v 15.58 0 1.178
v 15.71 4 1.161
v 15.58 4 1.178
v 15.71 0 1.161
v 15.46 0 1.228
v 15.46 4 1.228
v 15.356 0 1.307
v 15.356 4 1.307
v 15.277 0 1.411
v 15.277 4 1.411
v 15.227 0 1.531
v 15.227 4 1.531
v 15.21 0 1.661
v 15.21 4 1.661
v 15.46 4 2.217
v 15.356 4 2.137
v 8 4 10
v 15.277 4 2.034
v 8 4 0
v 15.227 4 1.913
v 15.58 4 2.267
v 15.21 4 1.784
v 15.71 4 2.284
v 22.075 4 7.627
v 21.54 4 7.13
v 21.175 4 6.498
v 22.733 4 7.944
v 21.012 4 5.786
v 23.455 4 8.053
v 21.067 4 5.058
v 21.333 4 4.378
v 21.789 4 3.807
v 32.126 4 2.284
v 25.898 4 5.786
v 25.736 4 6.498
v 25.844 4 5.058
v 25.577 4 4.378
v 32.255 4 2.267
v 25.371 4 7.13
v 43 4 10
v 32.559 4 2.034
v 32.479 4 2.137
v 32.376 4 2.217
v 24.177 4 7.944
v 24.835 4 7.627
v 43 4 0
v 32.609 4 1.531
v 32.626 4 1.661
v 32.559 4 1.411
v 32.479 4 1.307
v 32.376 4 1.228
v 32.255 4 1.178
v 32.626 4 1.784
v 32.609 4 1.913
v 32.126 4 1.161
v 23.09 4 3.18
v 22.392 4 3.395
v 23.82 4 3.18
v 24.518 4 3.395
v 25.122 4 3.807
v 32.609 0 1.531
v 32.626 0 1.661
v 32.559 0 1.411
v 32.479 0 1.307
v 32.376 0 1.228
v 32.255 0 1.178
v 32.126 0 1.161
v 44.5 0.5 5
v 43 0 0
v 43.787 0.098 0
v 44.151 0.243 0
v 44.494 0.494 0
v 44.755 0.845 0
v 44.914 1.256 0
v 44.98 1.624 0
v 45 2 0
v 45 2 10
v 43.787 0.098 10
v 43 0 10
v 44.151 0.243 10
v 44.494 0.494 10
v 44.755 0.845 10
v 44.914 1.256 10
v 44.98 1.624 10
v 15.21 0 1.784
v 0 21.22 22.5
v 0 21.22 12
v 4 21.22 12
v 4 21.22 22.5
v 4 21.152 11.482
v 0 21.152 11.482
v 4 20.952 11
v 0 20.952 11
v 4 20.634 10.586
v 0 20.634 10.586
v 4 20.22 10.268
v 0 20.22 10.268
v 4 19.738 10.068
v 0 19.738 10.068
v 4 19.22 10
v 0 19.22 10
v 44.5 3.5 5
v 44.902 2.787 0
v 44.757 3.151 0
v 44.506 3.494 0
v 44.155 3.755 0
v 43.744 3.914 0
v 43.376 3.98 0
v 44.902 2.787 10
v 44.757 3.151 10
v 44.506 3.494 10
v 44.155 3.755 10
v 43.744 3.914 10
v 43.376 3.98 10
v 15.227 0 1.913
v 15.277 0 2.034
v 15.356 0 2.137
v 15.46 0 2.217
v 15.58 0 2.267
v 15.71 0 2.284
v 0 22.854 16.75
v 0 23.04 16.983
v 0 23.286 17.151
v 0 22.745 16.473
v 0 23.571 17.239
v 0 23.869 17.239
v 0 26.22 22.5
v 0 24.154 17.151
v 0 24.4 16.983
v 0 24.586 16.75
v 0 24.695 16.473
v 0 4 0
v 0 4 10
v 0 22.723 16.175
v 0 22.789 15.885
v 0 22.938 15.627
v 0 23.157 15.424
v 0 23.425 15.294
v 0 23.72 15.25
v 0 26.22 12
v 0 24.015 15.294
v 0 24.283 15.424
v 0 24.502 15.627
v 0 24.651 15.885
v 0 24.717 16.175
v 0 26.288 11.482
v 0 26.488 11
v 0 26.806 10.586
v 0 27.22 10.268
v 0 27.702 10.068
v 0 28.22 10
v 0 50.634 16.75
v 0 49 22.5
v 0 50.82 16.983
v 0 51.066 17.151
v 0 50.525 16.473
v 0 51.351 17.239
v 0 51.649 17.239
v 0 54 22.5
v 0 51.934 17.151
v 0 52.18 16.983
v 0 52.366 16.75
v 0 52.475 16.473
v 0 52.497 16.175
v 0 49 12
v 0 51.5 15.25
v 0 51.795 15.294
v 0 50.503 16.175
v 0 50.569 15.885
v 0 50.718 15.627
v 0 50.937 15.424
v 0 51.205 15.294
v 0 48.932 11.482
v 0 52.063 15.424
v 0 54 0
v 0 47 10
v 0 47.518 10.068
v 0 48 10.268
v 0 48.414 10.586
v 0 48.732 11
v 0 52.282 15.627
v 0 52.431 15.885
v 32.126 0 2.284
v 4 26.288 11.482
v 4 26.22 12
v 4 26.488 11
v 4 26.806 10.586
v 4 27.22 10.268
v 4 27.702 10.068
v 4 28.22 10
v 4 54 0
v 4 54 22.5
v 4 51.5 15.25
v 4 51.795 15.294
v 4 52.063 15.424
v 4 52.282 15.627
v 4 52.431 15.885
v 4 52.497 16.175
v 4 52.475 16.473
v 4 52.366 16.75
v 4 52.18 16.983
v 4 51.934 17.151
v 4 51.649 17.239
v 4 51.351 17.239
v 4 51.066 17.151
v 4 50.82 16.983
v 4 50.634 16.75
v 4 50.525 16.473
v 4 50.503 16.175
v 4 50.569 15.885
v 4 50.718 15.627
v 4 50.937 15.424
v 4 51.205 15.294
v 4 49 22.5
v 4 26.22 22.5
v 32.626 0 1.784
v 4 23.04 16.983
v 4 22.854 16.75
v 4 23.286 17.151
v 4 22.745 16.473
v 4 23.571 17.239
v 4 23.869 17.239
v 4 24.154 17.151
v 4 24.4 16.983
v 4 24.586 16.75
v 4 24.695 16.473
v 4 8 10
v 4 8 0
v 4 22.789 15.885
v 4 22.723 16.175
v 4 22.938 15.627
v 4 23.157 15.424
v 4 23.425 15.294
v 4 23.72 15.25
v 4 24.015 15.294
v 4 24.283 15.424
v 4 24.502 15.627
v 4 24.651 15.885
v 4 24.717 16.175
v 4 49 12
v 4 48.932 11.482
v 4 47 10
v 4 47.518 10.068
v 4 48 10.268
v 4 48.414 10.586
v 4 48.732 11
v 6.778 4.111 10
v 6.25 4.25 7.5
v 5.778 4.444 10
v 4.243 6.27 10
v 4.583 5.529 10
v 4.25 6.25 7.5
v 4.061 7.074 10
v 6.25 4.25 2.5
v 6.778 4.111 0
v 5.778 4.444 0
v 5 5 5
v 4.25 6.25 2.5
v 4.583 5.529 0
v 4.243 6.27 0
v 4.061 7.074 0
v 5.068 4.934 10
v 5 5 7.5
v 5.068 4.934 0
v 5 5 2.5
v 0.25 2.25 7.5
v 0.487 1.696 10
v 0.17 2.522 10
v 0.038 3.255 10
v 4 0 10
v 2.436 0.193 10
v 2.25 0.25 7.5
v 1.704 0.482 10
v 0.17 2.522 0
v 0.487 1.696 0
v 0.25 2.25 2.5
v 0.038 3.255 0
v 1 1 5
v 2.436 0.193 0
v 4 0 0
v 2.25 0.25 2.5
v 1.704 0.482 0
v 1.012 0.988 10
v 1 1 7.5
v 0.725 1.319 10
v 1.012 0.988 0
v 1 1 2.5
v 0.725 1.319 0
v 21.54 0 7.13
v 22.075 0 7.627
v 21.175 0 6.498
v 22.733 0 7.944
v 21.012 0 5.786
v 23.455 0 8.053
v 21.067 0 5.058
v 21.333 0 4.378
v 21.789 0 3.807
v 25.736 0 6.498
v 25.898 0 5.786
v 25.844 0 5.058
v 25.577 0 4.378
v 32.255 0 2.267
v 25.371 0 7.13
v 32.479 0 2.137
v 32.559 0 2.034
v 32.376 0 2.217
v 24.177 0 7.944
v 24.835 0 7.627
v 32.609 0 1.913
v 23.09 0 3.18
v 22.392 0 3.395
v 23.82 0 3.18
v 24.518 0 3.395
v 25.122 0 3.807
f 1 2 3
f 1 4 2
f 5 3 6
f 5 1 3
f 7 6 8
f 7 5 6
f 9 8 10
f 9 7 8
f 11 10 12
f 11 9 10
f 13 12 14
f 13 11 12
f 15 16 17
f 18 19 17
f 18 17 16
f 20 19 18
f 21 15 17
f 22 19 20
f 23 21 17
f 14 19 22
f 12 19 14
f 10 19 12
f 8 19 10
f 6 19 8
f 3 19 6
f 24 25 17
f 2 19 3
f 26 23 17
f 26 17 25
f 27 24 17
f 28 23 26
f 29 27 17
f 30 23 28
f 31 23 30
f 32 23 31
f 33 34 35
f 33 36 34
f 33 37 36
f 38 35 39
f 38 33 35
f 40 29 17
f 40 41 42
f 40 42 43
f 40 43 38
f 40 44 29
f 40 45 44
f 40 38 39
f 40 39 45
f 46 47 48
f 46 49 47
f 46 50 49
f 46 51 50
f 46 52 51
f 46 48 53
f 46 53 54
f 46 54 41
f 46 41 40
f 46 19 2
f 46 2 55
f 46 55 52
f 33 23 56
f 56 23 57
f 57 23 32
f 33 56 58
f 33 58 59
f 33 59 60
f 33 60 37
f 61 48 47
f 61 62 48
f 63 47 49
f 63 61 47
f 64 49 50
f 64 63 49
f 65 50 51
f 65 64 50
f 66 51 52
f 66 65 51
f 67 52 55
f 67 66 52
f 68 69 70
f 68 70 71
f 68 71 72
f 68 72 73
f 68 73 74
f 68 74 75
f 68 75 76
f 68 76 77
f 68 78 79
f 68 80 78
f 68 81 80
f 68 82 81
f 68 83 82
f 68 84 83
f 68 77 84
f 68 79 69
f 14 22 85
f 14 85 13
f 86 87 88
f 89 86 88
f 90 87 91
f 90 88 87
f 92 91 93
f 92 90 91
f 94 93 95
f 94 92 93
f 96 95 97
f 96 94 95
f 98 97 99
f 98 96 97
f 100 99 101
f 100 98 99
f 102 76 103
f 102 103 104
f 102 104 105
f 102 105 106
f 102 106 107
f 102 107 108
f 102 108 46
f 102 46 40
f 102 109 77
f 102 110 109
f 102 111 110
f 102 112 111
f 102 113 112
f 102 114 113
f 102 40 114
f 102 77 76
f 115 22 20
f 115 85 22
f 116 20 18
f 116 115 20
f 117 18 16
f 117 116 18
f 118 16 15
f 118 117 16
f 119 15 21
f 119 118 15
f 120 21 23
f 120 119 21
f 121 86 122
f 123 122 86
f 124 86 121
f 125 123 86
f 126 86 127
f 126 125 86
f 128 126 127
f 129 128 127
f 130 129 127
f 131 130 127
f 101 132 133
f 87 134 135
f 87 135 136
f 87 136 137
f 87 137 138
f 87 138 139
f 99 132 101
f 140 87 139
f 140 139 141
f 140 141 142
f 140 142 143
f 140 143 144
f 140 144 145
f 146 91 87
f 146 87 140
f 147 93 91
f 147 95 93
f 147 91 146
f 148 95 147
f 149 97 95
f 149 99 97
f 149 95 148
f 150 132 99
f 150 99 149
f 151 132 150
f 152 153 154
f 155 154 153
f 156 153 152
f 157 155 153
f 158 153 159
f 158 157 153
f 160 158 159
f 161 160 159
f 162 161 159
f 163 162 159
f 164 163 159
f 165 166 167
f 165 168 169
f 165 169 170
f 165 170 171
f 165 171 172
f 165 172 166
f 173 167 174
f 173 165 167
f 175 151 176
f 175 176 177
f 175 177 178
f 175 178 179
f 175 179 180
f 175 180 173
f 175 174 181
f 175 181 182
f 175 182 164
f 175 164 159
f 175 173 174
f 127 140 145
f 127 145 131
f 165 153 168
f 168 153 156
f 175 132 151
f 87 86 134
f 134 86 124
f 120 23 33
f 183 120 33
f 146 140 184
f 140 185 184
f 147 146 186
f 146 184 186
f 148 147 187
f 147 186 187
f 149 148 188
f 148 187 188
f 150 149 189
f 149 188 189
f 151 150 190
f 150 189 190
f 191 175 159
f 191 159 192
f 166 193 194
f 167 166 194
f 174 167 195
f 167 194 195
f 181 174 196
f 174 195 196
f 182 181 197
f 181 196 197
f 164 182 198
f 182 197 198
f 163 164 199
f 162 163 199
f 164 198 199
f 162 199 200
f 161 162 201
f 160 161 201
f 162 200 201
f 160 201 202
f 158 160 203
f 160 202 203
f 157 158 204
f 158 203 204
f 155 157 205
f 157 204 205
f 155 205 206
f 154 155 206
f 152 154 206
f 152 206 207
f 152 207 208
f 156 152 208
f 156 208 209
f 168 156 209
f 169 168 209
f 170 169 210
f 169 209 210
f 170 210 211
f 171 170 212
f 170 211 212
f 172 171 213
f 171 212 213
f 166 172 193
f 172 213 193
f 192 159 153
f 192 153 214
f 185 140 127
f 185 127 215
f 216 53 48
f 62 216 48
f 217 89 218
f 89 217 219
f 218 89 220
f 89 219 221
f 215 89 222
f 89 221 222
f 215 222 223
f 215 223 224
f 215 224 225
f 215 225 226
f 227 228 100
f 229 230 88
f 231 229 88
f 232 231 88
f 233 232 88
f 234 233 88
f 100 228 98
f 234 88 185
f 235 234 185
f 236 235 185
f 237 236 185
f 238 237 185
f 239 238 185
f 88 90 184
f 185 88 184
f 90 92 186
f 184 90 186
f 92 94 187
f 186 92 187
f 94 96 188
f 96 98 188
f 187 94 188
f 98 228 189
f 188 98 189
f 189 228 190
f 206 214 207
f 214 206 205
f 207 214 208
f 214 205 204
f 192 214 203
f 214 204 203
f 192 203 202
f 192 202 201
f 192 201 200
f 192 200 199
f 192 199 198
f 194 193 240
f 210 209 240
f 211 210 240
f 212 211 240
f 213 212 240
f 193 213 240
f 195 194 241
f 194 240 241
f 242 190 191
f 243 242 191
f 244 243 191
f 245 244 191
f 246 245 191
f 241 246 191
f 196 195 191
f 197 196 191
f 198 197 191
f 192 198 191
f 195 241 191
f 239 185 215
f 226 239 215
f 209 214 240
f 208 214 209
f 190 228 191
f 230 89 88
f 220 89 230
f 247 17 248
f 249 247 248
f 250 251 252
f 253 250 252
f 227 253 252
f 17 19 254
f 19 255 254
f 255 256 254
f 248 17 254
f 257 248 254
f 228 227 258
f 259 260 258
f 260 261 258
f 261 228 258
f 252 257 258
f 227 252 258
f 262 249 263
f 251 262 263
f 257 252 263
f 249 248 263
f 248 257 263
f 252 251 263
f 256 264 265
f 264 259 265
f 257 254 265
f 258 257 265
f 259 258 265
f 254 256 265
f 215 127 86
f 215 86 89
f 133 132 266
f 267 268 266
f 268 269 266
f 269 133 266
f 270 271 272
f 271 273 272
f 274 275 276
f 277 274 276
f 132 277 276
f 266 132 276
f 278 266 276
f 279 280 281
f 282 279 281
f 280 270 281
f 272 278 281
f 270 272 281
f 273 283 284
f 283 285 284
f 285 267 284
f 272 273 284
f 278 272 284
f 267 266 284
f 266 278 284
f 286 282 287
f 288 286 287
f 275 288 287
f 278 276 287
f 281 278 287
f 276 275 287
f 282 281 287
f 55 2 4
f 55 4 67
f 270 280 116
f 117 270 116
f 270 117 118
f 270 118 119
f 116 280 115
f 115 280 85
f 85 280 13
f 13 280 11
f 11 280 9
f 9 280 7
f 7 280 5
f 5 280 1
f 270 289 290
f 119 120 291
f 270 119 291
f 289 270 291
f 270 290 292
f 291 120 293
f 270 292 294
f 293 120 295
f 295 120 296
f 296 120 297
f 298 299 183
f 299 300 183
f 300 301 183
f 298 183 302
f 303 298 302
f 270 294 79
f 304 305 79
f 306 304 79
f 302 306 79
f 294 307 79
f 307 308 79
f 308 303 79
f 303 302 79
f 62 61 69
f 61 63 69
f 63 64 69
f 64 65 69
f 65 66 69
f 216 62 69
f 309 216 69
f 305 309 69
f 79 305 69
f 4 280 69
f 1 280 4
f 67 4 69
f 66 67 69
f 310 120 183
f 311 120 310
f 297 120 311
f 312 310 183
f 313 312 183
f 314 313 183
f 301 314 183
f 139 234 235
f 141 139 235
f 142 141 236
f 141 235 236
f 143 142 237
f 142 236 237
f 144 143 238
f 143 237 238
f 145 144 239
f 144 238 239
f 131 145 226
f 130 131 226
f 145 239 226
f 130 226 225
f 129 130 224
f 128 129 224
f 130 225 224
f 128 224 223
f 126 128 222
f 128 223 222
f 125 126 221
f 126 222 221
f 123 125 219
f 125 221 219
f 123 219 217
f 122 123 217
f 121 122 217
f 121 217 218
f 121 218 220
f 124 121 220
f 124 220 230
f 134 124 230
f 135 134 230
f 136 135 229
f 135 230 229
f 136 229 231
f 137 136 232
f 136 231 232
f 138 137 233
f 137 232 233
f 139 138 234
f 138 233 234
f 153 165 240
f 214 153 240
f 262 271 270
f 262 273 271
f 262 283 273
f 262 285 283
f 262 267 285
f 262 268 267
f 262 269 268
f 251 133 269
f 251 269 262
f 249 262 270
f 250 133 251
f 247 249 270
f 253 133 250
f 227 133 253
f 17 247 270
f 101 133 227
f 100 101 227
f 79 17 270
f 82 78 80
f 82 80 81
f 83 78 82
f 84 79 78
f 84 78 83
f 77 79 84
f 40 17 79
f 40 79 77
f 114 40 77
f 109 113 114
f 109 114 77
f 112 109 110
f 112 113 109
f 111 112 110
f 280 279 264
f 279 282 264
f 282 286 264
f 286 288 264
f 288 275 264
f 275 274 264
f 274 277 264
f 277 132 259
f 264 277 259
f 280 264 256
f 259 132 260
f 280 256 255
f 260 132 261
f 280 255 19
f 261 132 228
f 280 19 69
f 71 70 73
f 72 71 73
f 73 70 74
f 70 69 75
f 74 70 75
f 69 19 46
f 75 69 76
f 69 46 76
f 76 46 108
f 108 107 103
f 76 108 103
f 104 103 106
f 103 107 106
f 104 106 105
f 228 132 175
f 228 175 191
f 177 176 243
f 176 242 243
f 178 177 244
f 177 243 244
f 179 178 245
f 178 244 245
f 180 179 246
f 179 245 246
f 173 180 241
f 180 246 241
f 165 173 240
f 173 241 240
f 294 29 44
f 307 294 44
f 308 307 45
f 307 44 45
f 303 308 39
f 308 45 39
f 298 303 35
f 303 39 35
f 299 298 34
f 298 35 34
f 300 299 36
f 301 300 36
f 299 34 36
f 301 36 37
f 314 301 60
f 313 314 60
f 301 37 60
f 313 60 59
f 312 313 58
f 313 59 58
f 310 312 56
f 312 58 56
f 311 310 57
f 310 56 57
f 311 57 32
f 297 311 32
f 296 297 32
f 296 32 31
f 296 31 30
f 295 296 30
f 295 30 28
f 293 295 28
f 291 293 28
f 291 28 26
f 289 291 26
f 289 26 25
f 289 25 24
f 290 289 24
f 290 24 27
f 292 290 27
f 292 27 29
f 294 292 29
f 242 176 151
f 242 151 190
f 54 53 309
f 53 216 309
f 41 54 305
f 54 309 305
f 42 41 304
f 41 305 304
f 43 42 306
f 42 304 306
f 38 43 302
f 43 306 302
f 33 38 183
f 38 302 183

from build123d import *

# Parameters (mm, degrees)
SKETCH_1_W          = 4
SKETCH_1_H          = 50
SKETCH_1_W_2        = 45
SKETCH_1_H_2        = 4
EXTRUDE_1_DEPTH     = 10
SKETCH_2_W          = 4
SKETCH_2_H          = 5
EXTRUDE_2_DEPTH     = 12.5
SKETCH_3_R          = 1
CUT_EXTRUDE_1_DEPTH = 4
FILLET_1_DEPTH      = 10
FILLET_2_SIZE       = 4
FILLET_3_SIZE       = 2
FILLET_4_SIZE       = 2
SKETCH_27_R         = 1.552273675
CUT_EXTRUDE_2_DEPTH = 4
CUT_EXTRUDE_2_DRAFT = -7.86
FILLET_5_R          = 2
FILLET_6_R          = 2
FILLET_7_R          = 2
SKETCH_32_W         = 17.415964898
SKETCH_32_H         = 1.123035165
CUT_EXTRUDE_3_DEPTH = 4
SKETCH_26_R         = 2.45
CUT_EXTRUDE3_DEPTH  = 10
FILLET1_R           = 0.5
FILLET2_R           = 0.5
FILLET3_R           = 0.5
FILLET4_R           = 0.5


with BuildPart() as part:
    # Эскиз1 → Бобышка-Вытянуть1 (new body)
    with BuildSketch(Plane.XY):
        with Locations((2, 29)):
            Rectangle(SKETCH_1_W, SKETCH_1_H)
        with Locations((22.5, 2)):
            Rectangle(SKETCH_1_W_2, SKETCH_1_H_2)
    extrude(amount=EXTRUDE_1_DEPTH)

    # Эскиз2 → Бобышка-Вытянуть2 (add)
    with BuildSketch(Plane.XY.offset(10)):
        with Locations((2, 51.5)):
            Rectangle(SKETCH_2_W, SKETCH_2_H)
        with Locations((2, 23.72)):
            Rectangle(SKETCH_2_W, SKETCH_2_H)
    extrude(amount=EXTRUDE_2_DEPTH)

    # Эскиз3 → Вырез-Вытянуть1 (cut)
    with BuildSketch(Plane(origin=(4, 0, 0), x_dir=(0, 0, -1), z_dir=(1, 0, 0))):
        with Locations((-16.25, 51.5)):
            Circle(SKETCH_3_R)
        with Locations((-16.25, 23.72)):
            Circle(SKETCH_3_R)
    extrude(amount=-CUT_EXTRUDE_1_DEPTH, mode=Mode.SUBTRACT)

    # Скругление1: read off the stored shape, not the designer's step
    # Скругление1 outline → Скругление1 (add)
    with BuildSketch(Plane.XY):
        with BuildLine():
            Line((4, 4), (8, 4))
            add(Edge.make_bspline(
                [(8, 4), (4, 4), (4, 8)],
                knots=[0, 0, 0, 1, 1, 1], degree=2))
            Line((4, 8), (4, 4))
        make_face()
    extrude(amount=FILLET_1_DEPTH)

    # Скругление2
    # a fillet whose section is not a circle: 4 mm, written as the material it takes off along each edge
    with BuildSketch(Plane(origin=(0, 0, -10), x_dir=(0, 1, 0), z_dir=(0, 0, 1))) as fillet_2_piece_1:
        with BuildLine():
            Bezier((FILLET_2_SIZE, 0), (0, 0), (0, -FILLET_2_SIZE), weights=[1, 1, 1])
            Line((0, -FILLET_2_SIZE), (0, 0))
            Line((0, 0), (FILLET_2_SIZE, 0))
        make_face()
    extrude(amount=30, mode=Mode.SUBTRACT)

    # Скругление3
    # a fillet whose section is not a circle: 2 mm, written as the material it takes off along each edge
    with BuildSketch(Plane(origin=(45, 4, -5), x_dir=(-1, 0, 0), z_dir=(0, 0, 1))) as fillet_3_piece_1:
        with BuildLine():
            Bezier((FILLET_3_SIZE, 0), (0, 0), (0, FILLET_3_SIZE), weights=[1, 1, 1])
            Line((0, FILLET_3_SIZE), (0, 0))
            Line((0, 0), (FILLET_3_SIZE, 0))
        make_face()
    extrude(amount=20, mode=Mode.SUBTRACT)

    # Скругление4
    # a fillet whose section is not a circle: 2 mm, written as the material it takes off along each edge
    with BuildSketch(Plane(origin=(45, 0, -5), x_dir=(0, 1, 0), z_dir=(0, 0, 1))) as fillet_4_piece_1:
        with BuildLine():
            Bezier((FILLET_4_SIZE, 0), (0, 0), (0, FILLET_4_SIZE), weights=[1, 1, 1])
            Line((0, FILLET_4_SIZE), (0, 0))
            Line((0, 0), (FILLET_4_SIZE, 0))
        make_face()
    extrude(amount=20, mode=Mode.SUBTRACT)


with BuildPart() as cut_extrude_2_tool:
    # Эскиз27 → Вырез-Вытянуть2 (with draft: the straight prism first)
    with BuildSketch(Plane(origin=(0, 4, 0), x_dir=(1, 0, 0), z_dir=(0, 1, 0))):
        with Locations((23.455175104, -5.602717063)):
            Circle(SKETCH_27_R)
    extrude(amount=-CUT_EXTRUDE_2_DEPTH)
    # Вырез-Вытянуть2: the draft: its side faces are tilted about the plane it starts from
    cut_extrude_2_sides = [cut_extrude_2_tool.faces().sort_by_distance(p)[0] for p in [
        (21.902901429, 2, 5.602717063),
    ]]
    draft(cut_extrude_2_sides, Plane(origin=(0, 4, 0), x_dir=(1, 0, 0), z_dir=(0, 1, 0)), CUT_EXTRUDE_2_DRAFT)


with BuildPart() as part_1:
    add(part.part)

    # Вырез-Вытянуть2: cut by cut_extrude_2_tool
    add(cut_extrude_2_tool.part, mode=Mode.SUBTRACT)

    # Скругление5
    fillet_5_edges = [part_1.edges().sort_by_distance(p)[0] for p in [
        (2, 49, 10),
    ]]
    fillet(fillet_5_edges, radius=FILLET_5_R)

    # Скругление6
    fillet_6_edges = [part_1.edges().sort_by_distance(p)[0] for p in [
        (2, 21.22, 10),
    ]]
    fillet(fillet_6_edges, radius=FILLET_6_R)

    # Скругление7
    fillet_7_edges = [part_1.edges().sort_by_distance(p)[0] for p in [
        (2, 26.22, 10),
    ]]
    fillet(fillet_7_edges, radius=FILLET_7_R)

    # Эскиз32 → Вырез-Вытянуть3 (cut)
    with BuildSketch(Plane(origin=(0, 4, 0), x_dir=(1, 0, 0), z_dir=(0, 1, 0))):
        with Locations((23.917887929, -1.722044793)):
            Rectangle(SKETCH_32_W, SKETCH_32_H)
    extrude(amount=-CUT_EXTRUDE_3_DEPTH, mode=Mode.SUBTRACT)

    # Эскиз26 → Cut-Extrude3 (cut)
    with BuildSketch(Plane(origin=(0, 4, 0), x_dir=(1, 0, 0), z_dir=(0, 1, 0))):
        with Locations(Location((23.455175104, -5.602717063, 0), (0, 0, 270))):
            Circle(SKETCH_26_R)
    extrude(amount=-CUT_EXTRUDE3_DEPTH, mode=Mode.SUBTRACT)

    # Fillet1
    fillet1_edges = [part_1.edges().sort_by_distance(p)[0] for p in [
        (32.625870378, 2, 1.16052721),
    ]]
    fillet(fillet1_edges, radius=FILLET1_R)

    # Fillet2
    fillet2_edges = [part_1.edges().sort_by_distance(p)[0] for p in [
        (32.625870378, 2, 2.283562375),
    ]]
    fillet(fillet2_edges, radius=FILLET2_R)

    # Fillet3
    fillet3_edges = [part_1.edges().sort_by_distance(p)[0] for p in [
        (15.20990548, 2, 1.16052721),
    ]]
    fillet(fillet3_edges, radius=FILLET3_R)

    # Fillet4
    fillet4_edges = [part_1.edges().sort_by_distance(p)[0] for p in [
        (15.20990548, 2, 2.283562375),
    ]]
    fillet(fillet4_edges, radius=FILLET4_R)


solid = part_1.part
